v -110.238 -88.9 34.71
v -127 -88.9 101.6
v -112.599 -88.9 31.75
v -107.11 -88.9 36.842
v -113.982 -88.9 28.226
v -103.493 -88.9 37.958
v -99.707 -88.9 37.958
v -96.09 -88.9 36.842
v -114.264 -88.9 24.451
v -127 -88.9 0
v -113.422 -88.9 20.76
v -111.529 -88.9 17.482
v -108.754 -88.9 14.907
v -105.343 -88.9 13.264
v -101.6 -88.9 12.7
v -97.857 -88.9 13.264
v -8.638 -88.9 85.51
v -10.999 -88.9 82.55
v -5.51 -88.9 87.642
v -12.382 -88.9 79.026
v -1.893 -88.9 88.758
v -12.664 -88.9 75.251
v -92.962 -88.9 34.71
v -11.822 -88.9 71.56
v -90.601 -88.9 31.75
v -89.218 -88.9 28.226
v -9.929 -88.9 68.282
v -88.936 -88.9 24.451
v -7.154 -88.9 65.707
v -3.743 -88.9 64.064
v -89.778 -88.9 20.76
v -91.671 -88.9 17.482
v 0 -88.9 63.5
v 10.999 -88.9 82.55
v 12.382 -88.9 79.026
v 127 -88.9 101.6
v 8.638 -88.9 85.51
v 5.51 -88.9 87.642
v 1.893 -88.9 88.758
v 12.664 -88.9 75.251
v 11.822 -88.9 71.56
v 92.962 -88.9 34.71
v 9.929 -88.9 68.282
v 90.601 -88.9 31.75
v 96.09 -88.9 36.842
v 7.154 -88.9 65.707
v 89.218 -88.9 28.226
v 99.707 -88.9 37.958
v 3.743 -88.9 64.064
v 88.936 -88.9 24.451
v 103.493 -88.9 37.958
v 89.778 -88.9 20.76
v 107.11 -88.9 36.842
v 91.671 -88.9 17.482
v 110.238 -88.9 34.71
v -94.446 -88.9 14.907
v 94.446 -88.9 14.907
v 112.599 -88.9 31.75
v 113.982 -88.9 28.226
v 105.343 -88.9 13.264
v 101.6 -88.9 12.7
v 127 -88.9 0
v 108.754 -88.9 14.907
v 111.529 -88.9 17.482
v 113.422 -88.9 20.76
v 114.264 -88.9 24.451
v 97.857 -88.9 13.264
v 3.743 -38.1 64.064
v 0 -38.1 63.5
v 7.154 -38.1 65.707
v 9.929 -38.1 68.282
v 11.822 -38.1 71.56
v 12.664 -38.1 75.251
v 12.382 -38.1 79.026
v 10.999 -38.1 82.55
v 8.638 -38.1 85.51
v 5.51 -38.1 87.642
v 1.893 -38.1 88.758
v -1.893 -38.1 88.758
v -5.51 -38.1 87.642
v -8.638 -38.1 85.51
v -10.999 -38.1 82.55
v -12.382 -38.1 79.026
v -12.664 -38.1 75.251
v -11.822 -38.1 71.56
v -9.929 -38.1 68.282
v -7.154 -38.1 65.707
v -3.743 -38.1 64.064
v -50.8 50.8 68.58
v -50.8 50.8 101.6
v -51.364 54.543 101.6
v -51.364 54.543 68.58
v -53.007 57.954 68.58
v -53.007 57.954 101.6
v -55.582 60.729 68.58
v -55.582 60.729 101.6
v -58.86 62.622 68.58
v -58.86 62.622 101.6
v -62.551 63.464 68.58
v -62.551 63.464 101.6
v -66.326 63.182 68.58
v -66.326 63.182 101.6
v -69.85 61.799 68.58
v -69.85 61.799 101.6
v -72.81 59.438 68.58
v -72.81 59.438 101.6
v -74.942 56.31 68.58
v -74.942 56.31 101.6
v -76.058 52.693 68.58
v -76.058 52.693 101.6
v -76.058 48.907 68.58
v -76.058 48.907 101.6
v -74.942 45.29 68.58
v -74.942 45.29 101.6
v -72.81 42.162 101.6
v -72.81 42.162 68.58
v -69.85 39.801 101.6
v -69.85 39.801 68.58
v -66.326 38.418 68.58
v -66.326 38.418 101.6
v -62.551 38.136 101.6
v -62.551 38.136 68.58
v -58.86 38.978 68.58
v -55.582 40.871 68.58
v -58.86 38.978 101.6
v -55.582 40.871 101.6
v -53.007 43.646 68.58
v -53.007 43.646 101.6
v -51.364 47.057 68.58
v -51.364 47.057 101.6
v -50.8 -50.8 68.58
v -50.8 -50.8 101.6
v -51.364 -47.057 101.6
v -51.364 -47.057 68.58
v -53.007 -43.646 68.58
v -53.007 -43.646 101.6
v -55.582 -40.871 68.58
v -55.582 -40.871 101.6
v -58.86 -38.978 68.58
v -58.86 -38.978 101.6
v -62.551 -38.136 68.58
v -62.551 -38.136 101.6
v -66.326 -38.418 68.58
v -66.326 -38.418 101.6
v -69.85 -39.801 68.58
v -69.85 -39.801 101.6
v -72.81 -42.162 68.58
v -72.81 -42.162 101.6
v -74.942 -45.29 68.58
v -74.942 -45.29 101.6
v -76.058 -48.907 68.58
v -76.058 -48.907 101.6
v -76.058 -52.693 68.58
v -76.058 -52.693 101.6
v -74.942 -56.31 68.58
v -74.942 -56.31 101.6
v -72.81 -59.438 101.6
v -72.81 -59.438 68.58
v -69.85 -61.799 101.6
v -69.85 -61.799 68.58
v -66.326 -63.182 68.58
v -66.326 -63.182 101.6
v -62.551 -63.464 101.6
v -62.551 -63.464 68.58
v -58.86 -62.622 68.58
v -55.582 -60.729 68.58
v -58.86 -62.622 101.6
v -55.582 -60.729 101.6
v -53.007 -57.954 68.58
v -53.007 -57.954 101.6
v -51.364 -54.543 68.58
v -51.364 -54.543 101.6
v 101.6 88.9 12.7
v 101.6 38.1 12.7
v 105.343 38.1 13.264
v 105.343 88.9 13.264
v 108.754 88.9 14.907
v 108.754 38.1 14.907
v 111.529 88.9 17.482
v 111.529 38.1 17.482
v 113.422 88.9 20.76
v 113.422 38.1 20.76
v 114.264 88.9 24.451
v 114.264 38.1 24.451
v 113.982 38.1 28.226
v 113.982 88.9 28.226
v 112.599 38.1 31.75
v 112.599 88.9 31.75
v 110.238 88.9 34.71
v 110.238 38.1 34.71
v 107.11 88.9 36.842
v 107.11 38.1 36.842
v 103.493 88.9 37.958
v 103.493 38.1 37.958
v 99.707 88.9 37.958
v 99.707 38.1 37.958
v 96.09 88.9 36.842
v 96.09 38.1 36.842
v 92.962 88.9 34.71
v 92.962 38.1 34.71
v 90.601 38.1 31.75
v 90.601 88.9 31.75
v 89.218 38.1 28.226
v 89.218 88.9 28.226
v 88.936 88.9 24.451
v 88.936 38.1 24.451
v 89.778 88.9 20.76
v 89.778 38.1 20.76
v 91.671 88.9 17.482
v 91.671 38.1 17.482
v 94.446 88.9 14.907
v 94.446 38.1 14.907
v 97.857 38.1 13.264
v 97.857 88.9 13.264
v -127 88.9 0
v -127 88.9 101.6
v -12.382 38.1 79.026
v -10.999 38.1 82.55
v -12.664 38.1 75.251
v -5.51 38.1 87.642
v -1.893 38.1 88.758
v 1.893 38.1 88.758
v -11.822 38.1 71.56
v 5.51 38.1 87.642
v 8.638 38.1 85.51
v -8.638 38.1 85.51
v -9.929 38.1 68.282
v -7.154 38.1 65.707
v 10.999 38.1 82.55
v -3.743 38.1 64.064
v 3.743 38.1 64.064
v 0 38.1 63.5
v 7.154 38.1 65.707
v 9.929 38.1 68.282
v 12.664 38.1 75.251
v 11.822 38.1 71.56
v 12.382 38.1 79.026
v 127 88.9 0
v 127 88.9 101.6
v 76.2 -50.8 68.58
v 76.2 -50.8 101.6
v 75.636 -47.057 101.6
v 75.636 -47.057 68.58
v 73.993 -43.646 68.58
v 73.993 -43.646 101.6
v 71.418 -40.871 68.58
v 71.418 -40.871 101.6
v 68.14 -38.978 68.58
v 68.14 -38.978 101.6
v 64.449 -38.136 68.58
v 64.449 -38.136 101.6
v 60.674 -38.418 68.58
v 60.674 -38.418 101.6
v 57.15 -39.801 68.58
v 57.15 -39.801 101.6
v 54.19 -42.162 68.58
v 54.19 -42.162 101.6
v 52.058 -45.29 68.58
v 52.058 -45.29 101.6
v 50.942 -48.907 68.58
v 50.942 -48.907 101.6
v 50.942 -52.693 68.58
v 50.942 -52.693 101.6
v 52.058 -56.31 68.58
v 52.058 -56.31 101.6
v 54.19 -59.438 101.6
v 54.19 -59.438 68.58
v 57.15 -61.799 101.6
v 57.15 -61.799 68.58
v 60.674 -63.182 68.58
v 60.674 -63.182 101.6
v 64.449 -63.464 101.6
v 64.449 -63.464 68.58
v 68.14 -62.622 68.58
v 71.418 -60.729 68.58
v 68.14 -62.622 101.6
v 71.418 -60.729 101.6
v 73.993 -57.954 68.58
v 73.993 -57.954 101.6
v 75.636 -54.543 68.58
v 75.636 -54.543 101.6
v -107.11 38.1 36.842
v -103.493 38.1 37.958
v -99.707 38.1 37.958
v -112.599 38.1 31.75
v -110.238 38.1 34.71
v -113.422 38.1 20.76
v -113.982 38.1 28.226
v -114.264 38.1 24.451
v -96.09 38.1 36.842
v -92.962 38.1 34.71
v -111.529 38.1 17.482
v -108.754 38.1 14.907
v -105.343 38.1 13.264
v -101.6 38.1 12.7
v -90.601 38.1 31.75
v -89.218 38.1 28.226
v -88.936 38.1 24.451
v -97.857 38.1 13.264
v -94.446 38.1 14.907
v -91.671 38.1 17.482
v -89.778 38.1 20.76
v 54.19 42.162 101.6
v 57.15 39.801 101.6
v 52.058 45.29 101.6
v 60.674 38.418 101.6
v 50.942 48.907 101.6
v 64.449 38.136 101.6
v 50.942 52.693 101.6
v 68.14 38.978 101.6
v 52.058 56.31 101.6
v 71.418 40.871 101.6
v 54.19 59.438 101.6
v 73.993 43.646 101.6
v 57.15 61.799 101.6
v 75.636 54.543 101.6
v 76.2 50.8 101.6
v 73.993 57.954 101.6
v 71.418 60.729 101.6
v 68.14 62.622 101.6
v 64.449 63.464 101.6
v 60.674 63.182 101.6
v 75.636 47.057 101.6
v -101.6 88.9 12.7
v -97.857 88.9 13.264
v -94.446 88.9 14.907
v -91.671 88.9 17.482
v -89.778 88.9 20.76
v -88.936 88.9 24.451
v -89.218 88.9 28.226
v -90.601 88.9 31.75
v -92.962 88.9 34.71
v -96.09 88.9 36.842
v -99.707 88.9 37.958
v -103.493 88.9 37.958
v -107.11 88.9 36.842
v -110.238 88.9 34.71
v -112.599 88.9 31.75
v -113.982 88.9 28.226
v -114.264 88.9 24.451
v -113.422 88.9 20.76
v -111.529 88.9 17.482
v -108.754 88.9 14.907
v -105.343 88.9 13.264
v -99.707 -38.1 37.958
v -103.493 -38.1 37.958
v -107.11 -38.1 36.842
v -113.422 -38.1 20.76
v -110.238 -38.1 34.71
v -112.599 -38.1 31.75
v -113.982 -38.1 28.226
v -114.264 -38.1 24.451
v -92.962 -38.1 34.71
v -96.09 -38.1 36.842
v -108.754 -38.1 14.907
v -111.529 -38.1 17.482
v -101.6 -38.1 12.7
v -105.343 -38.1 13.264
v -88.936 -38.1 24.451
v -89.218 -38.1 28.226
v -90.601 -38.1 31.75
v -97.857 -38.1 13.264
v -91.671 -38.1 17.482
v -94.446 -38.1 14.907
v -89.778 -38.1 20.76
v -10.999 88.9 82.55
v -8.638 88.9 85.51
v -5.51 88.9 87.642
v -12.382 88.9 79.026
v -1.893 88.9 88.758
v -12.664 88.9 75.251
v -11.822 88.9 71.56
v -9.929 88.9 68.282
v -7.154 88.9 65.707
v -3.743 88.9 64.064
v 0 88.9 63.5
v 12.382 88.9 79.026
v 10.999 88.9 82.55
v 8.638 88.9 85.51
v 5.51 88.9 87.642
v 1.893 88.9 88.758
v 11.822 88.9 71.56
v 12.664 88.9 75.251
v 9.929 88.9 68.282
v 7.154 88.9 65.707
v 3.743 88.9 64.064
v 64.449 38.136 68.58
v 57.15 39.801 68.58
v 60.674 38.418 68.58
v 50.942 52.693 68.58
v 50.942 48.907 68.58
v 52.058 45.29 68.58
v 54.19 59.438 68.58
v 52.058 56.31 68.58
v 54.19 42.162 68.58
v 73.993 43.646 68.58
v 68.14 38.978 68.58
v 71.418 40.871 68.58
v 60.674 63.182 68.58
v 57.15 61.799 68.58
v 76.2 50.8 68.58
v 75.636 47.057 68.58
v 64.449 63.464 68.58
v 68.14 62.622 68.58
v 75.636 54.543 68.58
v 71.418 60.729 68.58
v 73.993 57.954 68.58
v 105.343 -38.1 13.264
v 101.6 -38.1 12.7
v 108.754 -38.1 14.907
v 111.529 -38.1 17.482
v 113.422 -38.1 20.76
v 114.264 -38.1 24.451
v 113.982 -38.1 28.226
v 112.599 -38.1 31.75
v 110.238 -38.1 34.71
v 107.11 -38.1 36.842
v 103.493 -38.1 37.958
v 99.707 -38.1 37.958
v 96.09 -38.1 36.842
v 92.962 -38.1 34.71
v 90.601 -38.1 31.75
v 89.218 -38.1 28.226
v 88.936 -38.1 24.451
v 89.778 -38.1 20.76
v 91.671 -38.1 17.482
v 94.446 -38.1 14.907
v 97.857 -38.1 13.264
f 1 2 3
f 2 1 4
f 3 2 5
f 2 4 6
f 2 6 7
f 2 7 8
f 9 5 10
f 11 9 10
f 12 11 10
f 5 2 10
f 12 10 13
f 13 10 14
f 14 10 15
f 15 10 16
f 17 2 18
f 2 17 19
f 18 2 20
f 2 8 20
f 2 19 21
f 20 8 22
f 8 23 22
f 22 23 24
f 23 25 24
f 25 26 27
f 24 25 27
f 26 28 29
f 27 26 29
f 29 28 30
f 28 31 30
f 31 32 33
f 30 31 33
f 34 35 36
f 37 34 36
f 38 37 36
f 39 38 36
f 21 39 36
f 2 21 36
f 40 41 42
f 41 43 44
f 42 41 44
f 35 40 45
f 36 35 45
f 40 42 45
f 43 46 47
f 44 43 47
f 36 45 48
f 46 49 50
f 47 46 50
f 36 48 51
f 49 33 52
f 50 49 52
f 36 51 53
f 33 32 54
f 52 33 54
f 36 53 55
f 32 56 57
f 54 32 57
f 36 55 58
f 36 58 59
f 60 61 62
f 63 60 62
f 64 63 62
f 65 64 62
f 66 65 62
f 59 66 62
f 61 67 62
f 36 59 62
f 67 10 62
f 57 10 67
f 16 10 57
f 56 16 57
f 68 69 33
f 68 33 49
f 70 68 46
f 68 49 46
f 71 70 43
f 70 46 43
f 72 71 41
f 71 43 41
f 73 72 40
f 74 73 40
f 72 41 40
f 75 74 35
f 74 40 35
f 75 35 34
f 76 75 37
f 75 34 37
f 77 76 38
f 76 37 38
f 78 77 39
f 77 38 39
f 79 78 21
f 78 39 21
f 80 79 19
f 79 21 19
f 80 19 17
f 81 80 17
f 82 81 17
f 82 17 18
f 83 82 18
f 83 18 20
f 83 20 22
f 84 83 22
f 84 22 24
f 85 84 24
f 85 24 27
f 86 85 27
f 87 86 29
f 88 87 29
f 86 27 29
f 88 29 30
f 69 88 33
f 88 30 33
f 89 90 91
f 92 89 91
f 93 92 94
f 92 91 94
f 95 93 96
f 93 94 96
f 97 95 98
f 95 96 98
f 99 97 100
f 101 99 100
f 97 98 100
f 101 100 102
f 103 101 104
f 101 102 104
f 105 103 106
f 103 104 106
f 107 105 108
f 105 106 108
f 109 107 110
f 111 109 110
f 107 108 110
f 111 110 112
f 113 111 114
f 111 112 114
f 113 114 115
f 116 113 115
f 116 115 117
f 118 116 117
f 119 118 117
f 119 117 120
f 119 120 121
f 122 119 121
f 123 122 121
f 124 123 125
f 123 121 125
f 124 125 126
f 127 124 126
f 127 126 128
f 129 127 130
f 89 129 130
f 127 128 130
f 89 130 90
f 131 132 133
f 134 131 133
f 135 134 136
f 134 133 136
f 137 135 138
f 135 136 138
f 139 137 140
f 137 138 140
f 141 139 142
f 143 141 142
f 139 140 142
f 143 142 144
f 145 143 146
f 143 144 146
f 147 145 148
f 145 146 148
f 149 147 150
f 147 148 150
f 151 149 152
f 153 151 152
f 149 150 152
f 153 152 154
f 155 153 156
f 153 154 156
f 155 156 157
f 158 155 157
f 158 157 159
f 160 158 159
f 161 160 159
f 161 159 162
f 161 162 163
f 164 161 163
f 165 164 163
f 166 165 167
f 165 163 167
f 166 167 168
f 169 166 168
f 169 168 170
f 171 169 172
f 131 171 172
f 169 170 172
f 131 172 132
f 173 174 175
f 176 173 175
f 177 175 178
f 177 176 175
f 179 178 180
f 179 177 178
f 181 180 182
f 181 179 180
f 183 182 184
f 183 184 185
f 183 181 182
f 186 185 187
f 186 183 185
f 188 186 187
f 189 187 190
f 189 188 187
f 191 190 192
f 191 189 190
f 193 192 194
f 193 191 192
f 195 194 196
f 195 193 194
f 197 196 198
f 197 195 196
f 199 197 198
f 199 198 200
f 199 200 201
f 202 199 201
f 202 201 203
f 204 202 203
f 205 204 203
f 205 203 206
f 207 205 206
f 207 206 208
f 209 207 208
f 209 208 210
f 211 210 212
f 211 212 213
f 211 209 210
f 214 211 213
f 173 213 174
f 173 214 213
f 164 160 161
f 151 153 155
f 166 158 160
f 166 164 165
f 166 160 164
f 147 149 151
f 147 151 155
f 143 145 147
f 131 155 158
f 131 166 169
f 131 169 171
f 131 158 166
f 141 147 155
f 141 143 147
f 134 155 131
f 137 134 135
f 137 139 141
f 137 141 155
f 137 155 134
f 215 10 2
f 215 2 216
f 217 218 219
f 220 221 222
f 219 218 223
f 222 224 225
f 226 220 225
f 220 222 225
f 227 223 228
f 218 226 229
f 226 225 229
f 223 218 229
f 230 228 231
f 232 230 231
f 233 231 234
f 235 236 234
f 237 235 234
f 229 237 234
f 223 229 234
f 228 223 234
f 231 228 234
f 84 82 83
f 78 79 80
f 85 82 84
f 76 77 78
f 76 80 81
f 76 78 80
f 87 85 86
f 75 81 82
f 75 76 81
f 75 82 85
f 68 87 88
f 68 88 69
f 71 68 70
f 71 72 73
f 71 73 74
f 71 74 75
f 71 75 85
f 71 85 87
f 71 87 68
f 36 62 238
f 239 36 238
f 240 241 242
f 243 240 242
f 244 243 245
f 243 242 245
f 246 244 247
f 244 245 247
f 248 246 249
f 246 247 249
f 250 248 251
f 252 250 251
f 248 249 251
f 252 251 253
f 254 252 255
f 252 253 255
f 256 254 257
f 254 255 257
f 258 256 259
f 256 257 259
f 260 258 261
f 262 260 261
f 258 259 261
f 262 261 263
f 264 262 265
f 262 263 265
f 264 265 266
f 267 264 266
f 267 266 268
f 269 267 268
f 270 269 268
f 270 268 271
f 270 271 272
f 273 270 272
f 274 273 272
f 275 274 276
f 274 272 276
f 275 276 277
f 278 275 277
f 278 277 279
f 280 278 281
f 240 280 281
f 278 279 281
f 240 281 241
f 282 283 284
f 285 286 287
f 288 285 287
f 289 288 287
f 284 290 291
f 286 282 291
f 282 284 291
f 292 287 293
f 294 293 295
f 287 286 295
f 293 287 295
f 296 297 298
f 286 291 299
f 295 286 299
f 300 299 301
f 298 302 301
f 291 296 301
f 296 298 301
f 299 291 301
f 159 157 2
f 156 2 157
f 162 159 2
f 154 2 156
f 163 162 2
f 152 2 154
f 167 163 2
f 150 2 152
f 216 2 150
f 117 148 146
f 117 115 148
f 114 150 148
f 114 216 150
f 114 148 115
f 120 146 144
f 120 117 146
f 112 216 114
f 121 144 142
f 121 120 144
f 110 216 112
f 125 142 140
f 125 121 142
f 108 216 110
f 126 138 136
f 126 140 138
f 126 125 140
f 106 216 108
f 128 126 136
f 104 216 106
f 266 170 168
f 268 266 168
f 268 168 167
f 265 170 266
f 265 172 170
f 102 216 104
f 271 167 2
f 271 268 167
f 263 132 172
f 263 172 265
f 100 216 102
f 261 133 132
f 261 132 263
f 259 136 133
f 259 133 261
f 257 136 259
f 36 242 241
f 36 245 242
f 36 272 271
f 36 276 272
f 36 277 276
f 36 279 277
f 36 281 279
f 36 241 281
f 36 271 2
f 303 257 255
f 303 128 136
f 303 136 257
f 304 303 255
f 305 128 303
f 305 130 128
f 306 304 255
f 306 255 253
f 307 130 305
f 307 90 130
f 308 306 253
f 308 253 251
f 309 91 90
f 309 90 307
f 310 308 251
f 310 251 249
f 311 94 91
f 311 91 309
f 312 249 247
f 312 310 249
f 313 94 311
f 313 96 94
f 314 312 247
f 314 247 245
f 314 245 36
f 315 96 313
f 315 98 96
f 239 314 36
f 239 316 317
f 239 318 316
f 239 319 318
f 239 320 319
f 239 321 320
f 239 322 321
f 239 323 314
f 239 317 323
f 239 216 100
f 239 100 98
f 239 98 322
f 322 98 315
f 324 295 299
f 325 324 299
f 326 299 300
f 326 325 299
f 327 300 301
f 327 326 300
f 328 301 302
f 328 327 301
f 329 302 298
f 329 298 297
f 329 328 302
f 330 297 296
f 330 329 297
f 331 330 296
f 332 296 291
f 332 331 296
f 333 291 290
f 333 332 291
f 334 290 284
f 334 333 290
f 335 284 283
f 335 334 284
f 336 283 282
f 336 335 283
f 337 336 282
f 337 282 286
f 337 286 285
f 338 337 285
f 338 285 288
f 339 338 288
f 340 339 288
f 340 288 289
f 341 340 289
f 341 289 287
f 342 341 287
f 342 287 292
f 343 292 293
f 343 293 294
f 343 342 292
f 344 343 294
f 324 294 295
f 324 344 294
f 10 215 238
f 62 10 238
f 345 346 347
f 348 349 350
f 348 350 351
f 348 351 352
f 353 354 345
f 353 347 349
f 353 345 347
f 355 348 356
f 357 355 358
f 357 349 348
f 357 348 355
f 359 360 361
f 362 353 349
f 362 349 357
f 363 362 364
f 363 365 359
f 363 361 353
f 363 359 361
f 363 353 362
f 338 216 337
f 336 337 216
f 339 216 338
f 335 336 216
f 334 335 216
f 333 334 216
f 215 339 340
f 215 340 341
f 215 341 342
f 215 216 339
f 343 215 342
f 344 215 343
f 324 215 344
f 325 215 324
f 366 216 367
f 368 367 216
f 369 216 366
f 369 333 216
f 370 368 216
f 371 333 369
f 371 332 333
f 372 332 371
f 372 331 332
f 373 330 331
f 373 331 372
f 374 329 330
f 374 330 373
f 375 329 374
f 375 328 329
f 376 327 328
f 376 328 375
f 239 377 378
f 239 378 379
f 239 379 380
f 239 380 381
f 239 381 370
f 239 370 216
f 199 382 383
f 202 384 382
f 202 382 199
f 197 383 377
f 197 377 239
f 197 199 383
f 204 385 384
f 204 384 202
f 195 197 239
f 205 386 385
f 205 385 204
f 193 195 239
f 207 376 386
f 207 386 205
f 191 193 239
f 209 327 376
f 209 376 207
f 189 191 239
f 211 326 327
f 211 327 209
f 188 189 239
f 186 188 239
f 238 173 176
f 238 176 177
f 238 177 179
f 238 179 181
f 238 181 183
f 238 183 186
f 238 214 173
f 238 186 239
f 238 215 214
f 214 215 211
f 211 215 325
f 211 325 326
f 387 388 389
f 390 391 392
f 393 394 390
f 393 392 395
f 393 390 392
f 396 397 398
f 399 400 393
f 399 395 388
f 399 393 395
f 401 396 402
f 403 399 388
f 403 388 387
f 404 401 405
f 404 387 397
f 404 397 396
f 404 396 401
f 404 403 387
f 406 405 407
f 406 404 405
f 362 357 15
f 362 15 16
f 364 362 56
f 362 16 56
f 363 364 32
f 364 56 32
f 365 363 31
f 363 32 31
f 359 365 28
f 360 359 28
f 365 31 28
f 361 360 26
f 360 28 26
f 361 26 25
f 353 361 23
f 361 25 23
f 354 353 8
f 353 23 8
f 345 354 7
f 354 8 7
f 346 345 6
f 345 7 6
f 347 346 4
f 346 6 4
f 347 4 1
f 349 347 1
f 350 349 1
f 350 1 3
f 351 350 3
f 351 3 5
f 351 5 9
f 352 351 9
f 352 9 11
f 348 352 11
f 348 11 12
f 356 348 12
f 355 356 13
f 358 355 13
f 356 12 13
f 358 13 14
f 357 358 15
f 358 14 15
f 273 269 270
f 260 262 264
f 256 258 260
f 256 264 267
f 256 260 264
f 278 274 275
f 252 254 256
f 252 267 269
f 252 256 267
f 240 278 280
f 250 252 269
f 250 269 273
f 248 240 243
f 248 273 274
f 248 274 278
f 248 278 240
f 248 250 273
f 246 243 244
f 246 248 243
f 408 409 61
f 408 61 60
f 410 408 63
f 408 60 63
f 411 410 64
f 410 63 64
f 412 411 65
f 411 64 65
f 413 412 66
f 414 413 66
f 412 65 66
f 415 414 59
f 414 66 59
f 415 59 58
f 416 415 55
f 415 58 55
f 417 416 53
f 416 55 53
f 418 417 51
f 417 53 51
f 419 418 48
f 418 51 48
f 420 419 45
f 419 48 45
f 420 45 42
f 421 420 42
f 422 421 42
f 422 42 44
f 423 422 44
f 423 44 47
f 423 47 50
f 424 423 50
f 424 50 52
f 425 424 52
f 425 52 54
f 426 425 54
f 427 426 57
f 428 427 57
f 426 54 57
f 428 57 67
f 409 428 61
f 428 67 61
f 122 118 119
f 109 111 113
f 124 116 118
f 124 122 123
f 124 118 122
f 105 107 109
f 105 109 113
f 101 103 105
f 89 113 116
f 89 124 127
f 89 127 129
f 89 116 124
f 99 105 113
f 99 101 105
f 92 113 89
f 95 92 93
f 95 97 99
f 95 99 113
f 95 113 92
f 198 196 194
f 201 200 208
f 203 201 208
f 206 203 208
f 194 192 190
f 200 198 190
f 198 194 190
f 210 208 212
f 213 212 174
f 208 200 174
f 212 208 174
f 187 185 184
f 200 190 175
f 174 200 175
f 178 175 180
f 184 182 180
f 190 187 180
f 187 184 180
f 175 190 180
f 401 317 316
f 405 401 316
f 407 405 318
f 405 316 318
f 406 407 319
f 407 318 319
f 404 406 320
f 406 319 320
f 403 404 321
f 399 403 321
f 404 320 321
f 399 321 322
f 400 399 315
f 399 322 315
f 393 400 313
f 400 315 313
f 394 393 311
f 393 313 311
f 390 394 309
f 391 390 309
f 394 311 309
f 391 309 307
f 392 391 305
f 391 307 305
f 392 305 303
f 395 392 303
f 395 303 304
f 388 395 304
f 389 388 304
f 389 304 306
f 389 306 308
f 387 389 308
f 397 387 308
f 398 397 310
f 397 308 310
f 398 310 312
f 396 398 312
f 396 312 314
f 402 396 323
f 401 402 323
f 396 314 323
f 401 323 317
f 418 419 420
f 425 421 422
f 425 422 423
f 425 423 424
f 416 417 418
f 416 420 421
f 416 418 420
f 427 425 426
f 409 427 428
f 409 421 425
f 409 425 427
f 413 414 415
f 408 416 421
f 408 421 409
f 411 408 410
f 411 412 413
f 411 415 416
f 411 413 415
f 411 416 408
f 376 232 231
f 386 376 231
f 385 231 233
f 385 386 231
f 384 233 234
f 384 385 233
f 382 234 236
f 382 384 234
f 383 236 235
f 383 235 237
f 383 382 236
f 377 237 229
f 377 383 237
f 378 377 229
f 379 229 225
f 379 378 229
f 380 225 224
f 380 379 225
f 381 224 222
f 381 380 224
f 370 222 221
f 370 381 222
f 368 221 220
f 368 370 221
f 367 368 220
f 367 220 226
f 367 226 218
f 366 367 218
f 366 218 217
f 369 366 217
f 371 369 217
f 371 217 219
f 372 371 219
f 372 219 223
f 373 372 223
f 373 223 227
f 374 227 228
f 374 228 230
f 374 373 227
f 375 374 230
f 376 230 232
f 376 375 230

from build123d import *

# Parameters (mm, degrees)
SKETCH1_W           = 254
SKETCH1_H           = 177.8
BOSS_EXTRUDE1_DEPTH = 101.6
SKETCH4_R           = 12.7
CUT_EXTRUDE3_DEPTH  = 50.8
SKETCH6_R           = 12.7
CUT_EXTRUDE4_DEPTH  = 50.8
SKETCH7_R           = 12.7
CUT_EXTRUDE5_DEPTH  = 33.02


with BuildPart() as part:
    # Sketch1 → Boss-Extrude1 (new body)
    with BuildSketch(Plane.XY):
        Rectangle(SKETCH1_W, SKETCH1_H)
    extrude(amount=BOSS_EXTRUDE1_DEPTH)

    # Sketch4 → Cut-Extrude3 (cut)
    with BuildSketch(Plane.XZ.offset(88.9)):
        with Locations(Location((-101.6, 25.4, 0), (0, 0, 270))):
            Circle(SKETCH4_R)
        with Locations(Location((101.6, 25.4, 0), (0, 0, 270))):
            Circle(SKETCH4_R)
    cut_extrude3 = extrude(amount=-CUT_EXTRUDE3_DEPTH, mode=Mode.SUBTRACT)

    # Mirror4: Cut-Extrude3 across plane
    add(cut_extrude3.mirror(Plane.ZX), mode=Mode.SUBTRACT)

    # Sketch6 → Cut-Extrude4 (cut)
    with BuildSketch(Plane.XZ.offset(88.9)):
        with Locations(Location((0, 76.2, 0), (0, 0, 270))):
            Circle(SKETCH6_R)
    cut_extrude4 = extrude(amount=-CUT_EXTRUDE4_DEPTH, mode=Mode.SUBTRACT)

    # Mirror5: Cut-Extrude4 across plane
    add(cut_extrude4.mirror(Plane.ZX), mode=Mode.SUBTRACT)

    # Sketch7 → Cut-Extrude5 (cut)
    with BuildSketch(Plane.XY.offset(101.6)):
        with Locations((63.5, -50.8)):
            Circle(SKETCH7_R)
        with Locations((63.5, 50.8)):
            Circle(SKETCH7_R)
        with Locations((-63.5, -50.8)):
            Circle(SKETCH7_R)
        with Locations((-63.5, 50.8)):
            Circle(SKETCH7_R)
    extrude(amount=-CUT_EXTRUDE5_DEPTH, mode=Mode.SUBTRACT)


solid = part.part
